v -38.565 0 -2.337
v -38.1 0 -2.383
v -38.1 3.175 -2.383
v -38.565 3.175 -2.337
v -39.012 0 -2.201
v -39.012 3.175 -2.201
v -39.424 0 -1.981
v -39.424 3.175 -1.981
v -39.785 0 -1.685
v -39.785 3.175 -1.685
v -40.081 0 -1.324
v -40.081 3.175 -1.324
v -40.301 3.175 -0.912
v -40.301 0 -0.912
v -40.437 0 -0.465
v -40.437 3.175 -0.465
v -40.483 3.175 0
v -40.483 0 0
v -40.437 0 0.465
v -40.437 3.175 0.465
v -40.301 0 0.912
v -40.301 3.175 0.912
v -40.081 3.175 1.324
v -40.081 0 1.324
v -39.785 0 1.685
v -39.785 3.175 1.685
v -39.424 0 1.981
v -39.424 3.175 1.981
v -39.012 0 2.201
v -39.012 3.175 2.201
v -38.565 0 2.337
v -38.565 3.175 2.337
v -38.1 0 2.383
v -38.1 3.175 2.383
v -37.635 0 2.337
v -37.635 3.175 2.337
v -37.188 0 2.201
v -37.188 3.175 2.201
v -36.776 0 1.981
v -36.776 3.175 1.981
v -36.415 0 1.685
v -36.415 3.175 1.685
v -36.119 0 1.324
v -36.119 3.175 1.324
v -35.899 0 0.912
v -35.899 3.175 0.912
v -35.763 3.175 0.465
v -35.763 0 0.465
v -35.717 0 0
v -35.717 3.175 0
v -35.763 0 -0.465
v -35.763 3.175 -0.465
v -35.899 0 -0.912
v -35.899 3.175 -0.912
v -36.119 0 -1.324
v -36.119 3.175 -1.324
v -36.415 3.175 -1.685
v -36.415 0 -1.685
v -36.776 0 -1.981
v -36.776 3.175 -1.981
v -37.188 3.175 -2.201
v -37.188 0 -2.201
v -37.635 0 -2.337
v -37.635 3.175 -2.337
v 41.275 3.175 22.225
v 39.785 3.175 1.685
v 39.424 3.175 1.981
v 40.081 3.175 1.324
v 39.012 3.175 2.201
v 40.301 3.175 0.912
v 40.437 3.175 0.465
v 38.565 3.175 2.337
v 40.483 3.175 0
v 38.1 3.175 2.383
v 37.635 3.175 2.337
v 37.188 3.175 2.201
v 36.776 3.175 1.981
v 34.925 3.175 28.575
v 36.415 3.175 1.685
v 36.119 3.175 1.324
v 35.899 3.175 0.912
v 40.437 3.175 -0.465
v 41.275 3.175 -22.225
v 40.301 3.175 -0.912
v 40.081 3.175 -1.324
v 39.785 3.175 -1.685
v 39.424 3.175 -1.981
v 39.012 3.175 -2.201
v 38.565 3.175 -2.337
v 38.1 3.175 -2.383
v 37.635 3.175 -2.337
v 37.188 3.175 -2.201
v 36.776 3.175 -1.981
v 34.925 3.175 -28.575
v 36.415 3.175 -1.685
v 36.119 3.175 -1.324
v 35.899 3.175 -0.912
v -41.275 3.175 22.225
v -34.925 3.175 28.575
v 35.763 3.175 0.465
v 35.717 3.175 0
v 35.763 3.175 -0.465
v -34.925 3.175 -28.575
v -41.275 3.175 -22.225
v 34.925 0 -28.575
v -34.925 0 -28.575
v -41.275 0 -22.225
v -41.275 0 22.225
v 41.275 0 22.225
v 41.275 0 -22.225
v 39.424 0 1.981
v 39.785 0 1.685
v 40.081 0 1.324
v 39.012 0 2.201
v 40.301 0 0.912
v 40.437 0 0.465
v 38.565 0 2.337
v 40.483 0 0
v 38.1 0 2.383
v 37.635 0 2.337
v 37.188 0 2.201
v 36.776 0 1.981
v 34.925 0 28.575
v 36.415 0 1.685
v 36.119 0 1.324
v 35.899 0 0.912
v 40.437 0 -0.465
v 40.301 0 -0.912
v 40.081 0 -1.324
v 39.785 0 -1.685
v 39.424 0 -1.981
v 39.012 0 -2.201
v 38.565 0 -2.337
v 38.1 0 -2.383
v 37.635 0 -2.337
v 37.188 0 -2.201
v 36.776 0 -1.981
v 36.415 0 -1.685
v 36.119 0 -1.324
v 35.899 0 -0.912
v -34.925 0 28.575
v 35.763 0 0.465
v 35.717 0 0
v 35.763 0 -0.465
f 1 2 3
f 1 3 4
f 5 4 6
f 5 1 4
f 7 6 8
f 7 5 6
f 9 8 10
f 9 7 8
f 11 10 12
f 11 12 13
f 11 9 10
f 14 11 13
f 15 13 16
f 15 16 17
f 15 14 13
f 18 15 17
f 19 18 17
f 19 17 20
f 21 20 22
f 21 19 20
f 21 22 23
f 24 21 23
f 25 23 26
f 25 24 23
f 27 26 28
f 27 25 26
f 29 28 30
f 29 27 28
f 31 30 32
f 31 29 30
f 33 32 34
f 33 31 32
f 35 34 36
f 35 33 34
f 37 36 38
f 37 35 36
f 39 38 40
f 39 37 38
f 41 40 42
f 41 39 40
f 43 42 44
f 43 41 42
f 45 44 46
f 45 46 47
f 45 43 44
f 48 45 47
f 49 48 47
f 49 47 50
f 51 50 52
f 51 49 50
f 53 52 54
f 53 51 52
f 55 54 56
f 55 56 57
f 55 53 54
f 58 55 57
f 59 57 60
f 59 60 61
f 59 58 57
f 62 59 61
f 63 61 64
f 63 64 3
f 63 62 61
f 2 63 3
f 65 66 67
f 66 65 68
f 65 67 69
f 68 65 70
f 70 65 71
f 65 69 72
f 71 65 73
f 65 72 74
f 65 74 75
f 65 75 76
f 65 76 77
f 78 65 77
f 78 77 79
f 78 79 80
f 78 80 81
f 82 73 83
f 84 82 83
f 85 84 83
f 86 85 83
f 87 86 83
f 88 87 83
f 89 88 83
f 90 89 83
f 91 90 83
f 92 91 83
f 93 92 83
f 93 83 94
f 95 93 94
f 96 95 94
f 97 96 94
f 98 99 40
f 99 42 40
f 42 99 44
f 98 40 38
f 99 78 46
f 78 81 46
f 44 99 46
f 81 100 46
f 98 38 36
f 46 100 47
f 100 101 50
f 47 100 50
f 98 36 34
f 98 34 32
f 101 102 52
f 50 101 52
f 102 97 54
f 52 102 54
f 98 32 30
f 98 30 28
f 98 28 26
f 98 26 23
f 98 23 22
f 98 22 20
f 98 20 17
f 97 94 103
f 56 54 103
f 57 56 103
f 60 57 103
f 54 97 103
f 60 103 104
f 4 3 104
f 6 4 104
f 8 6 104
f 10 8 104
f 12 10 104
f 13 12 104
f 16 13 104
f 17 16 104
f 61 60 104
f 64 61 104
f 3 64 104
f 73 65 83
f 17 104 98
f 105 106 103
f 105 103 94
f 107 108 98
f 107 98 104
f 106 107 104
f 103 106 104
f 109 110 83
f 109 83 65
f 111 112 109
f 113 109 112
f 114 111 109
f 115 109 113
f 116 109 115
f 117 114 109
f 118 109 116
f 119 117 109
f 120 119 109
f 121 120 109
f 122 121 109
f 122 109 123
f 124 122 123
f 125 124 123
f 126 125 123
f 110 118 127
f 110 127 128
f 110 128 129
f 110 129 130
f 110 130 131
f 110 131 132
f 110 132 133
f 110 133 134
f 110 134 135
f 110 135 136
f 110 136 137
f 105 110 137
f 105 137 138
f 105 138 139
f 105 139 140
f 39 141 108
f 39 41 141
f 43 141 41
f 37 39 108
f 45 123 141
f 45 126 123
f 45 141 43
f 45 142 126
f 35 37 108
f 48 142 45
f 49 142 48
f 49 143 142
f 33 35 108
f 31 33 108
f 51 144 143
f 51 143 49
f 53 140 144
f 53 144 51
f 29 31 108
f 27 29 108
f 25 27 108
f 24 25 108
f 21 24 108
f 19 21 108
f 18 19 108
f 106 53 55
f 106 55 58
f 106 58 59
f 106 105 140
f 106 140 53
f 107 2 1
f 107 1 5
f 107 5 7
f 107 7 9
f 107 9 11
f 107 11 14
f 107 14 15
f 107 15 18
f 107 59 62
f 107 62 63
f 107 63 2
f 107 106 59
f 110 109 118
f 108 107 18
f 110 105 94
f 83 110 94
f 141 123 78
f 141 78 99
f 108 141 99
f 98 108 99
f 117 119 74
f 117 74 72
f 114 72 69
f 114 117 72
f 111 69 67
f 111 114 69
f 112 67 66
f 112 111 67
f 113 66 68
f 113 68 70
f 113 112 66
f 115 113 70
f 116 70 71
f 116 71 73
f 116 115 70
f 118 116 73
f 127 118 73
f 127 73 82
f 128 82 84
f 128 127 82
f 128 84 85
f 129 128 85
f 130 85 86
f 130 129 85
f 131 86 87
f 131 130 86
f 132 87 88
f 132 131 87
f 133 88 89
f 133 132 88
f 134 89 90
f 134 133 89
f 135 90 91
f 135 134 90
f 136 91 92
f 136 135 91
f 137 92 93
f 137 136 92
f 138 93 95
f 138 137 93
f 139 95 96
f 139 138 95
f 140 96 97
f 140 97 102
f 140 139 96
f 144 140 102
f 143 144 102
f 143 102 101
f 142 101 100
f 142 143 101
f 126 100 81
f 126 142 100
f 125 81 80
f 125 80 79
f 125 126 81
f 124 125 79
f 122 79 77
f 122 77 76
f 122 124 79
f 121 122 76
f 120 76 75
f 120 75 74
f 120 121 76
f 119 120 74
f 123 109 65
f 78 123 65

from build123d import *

# Parameters (mm, degrees)
SKETCH1_R      = 2.38252
EXTRUDE1_DEPTH = 3.175
EXTRUDE2_DEPTH = 3.175
CHAMFER1_SIZE  = 6.35


with BuildPart() as part:
    # Sketch1 → Extrude1 (new body)
    with BuildSketch(Plane(origin=(0, 0, 0), x_dir=(1, 0, 0), z_dir=(0, 1, 0))):
        with BuildLine():
            Line((-31.75, 28.575), (31.75, 28.575))
            ThreePointArc((31.75, 28.575), (38.485192091, 25.785192091), (41.275, 19.05))
            Line((41.275, 19.05), (41.275, -19.05))
            ThreePointArc((41.275, -19.05), (38.485192091, -25.785192091), (31.75, -28.575))
            Line((31.75, -28.575), (-31.75, -28.575))
            ThreePointArc((-31.75, -28.575), (-38.485192091, -25.785192091), (-41.275, -19.05))
            Line((-41.275, -19.05), (-41.275, 19.05))
            ThreePointArc((-41.275, 19.05), (-38.485192091, 25.785192091), (-31.75, 28.575))
        make_face()
        with Locations(Location((38.1, 0, 0), (0, 0, 270))):
            Circle(SKETCH1_R, mode=Mode.SUBTRACT)
        with Locations(Location((-38.1, 0, 0), (0, 0, 90))):
            Circle(SKETCH1_R, mode=Mode.SUBTRACT)
    extrude(amount=EXTRUDE1_DEPTH)

    # Sketch2 → Extrude2 (add)
    with BuildSketch(Plane(origin=(0, 0, 0), x_dir=(1, 0, 0), z_dir=(0, 1, 0))):
        Polygon((31.75, 28.575), (41.275, 19.05), (41.275, 28.575), align=None)
        Polygon((-31.75, 28.575), (-41.275, 19.05), (-41.275, 28.575), align=None)
        Polygon((-41.275, -19.05), (-31.75, -28.575), (-41.275, -28.575), align=None)
        Polygon((41.275, -19.05), (31.75, -28.575), (41.275, -28.575), align=None)
    extrude(amount=EXTRUDE2_DEPTH)

    # Chamfer1
    chamfer1_edges = [part.edges().sort_by_distance(p)[0] for p in [
        (41.275, 1.5875, -28.575),
        (-41.275, 1.5875, -28.575),
        (-41.275, 1.5875, 28.575),
        (41.275, 1.5875, 28.575),
    ]]
    chamfer(chamfer1_edges, length=CHAMFER1_SIZE)


solid = part.part
